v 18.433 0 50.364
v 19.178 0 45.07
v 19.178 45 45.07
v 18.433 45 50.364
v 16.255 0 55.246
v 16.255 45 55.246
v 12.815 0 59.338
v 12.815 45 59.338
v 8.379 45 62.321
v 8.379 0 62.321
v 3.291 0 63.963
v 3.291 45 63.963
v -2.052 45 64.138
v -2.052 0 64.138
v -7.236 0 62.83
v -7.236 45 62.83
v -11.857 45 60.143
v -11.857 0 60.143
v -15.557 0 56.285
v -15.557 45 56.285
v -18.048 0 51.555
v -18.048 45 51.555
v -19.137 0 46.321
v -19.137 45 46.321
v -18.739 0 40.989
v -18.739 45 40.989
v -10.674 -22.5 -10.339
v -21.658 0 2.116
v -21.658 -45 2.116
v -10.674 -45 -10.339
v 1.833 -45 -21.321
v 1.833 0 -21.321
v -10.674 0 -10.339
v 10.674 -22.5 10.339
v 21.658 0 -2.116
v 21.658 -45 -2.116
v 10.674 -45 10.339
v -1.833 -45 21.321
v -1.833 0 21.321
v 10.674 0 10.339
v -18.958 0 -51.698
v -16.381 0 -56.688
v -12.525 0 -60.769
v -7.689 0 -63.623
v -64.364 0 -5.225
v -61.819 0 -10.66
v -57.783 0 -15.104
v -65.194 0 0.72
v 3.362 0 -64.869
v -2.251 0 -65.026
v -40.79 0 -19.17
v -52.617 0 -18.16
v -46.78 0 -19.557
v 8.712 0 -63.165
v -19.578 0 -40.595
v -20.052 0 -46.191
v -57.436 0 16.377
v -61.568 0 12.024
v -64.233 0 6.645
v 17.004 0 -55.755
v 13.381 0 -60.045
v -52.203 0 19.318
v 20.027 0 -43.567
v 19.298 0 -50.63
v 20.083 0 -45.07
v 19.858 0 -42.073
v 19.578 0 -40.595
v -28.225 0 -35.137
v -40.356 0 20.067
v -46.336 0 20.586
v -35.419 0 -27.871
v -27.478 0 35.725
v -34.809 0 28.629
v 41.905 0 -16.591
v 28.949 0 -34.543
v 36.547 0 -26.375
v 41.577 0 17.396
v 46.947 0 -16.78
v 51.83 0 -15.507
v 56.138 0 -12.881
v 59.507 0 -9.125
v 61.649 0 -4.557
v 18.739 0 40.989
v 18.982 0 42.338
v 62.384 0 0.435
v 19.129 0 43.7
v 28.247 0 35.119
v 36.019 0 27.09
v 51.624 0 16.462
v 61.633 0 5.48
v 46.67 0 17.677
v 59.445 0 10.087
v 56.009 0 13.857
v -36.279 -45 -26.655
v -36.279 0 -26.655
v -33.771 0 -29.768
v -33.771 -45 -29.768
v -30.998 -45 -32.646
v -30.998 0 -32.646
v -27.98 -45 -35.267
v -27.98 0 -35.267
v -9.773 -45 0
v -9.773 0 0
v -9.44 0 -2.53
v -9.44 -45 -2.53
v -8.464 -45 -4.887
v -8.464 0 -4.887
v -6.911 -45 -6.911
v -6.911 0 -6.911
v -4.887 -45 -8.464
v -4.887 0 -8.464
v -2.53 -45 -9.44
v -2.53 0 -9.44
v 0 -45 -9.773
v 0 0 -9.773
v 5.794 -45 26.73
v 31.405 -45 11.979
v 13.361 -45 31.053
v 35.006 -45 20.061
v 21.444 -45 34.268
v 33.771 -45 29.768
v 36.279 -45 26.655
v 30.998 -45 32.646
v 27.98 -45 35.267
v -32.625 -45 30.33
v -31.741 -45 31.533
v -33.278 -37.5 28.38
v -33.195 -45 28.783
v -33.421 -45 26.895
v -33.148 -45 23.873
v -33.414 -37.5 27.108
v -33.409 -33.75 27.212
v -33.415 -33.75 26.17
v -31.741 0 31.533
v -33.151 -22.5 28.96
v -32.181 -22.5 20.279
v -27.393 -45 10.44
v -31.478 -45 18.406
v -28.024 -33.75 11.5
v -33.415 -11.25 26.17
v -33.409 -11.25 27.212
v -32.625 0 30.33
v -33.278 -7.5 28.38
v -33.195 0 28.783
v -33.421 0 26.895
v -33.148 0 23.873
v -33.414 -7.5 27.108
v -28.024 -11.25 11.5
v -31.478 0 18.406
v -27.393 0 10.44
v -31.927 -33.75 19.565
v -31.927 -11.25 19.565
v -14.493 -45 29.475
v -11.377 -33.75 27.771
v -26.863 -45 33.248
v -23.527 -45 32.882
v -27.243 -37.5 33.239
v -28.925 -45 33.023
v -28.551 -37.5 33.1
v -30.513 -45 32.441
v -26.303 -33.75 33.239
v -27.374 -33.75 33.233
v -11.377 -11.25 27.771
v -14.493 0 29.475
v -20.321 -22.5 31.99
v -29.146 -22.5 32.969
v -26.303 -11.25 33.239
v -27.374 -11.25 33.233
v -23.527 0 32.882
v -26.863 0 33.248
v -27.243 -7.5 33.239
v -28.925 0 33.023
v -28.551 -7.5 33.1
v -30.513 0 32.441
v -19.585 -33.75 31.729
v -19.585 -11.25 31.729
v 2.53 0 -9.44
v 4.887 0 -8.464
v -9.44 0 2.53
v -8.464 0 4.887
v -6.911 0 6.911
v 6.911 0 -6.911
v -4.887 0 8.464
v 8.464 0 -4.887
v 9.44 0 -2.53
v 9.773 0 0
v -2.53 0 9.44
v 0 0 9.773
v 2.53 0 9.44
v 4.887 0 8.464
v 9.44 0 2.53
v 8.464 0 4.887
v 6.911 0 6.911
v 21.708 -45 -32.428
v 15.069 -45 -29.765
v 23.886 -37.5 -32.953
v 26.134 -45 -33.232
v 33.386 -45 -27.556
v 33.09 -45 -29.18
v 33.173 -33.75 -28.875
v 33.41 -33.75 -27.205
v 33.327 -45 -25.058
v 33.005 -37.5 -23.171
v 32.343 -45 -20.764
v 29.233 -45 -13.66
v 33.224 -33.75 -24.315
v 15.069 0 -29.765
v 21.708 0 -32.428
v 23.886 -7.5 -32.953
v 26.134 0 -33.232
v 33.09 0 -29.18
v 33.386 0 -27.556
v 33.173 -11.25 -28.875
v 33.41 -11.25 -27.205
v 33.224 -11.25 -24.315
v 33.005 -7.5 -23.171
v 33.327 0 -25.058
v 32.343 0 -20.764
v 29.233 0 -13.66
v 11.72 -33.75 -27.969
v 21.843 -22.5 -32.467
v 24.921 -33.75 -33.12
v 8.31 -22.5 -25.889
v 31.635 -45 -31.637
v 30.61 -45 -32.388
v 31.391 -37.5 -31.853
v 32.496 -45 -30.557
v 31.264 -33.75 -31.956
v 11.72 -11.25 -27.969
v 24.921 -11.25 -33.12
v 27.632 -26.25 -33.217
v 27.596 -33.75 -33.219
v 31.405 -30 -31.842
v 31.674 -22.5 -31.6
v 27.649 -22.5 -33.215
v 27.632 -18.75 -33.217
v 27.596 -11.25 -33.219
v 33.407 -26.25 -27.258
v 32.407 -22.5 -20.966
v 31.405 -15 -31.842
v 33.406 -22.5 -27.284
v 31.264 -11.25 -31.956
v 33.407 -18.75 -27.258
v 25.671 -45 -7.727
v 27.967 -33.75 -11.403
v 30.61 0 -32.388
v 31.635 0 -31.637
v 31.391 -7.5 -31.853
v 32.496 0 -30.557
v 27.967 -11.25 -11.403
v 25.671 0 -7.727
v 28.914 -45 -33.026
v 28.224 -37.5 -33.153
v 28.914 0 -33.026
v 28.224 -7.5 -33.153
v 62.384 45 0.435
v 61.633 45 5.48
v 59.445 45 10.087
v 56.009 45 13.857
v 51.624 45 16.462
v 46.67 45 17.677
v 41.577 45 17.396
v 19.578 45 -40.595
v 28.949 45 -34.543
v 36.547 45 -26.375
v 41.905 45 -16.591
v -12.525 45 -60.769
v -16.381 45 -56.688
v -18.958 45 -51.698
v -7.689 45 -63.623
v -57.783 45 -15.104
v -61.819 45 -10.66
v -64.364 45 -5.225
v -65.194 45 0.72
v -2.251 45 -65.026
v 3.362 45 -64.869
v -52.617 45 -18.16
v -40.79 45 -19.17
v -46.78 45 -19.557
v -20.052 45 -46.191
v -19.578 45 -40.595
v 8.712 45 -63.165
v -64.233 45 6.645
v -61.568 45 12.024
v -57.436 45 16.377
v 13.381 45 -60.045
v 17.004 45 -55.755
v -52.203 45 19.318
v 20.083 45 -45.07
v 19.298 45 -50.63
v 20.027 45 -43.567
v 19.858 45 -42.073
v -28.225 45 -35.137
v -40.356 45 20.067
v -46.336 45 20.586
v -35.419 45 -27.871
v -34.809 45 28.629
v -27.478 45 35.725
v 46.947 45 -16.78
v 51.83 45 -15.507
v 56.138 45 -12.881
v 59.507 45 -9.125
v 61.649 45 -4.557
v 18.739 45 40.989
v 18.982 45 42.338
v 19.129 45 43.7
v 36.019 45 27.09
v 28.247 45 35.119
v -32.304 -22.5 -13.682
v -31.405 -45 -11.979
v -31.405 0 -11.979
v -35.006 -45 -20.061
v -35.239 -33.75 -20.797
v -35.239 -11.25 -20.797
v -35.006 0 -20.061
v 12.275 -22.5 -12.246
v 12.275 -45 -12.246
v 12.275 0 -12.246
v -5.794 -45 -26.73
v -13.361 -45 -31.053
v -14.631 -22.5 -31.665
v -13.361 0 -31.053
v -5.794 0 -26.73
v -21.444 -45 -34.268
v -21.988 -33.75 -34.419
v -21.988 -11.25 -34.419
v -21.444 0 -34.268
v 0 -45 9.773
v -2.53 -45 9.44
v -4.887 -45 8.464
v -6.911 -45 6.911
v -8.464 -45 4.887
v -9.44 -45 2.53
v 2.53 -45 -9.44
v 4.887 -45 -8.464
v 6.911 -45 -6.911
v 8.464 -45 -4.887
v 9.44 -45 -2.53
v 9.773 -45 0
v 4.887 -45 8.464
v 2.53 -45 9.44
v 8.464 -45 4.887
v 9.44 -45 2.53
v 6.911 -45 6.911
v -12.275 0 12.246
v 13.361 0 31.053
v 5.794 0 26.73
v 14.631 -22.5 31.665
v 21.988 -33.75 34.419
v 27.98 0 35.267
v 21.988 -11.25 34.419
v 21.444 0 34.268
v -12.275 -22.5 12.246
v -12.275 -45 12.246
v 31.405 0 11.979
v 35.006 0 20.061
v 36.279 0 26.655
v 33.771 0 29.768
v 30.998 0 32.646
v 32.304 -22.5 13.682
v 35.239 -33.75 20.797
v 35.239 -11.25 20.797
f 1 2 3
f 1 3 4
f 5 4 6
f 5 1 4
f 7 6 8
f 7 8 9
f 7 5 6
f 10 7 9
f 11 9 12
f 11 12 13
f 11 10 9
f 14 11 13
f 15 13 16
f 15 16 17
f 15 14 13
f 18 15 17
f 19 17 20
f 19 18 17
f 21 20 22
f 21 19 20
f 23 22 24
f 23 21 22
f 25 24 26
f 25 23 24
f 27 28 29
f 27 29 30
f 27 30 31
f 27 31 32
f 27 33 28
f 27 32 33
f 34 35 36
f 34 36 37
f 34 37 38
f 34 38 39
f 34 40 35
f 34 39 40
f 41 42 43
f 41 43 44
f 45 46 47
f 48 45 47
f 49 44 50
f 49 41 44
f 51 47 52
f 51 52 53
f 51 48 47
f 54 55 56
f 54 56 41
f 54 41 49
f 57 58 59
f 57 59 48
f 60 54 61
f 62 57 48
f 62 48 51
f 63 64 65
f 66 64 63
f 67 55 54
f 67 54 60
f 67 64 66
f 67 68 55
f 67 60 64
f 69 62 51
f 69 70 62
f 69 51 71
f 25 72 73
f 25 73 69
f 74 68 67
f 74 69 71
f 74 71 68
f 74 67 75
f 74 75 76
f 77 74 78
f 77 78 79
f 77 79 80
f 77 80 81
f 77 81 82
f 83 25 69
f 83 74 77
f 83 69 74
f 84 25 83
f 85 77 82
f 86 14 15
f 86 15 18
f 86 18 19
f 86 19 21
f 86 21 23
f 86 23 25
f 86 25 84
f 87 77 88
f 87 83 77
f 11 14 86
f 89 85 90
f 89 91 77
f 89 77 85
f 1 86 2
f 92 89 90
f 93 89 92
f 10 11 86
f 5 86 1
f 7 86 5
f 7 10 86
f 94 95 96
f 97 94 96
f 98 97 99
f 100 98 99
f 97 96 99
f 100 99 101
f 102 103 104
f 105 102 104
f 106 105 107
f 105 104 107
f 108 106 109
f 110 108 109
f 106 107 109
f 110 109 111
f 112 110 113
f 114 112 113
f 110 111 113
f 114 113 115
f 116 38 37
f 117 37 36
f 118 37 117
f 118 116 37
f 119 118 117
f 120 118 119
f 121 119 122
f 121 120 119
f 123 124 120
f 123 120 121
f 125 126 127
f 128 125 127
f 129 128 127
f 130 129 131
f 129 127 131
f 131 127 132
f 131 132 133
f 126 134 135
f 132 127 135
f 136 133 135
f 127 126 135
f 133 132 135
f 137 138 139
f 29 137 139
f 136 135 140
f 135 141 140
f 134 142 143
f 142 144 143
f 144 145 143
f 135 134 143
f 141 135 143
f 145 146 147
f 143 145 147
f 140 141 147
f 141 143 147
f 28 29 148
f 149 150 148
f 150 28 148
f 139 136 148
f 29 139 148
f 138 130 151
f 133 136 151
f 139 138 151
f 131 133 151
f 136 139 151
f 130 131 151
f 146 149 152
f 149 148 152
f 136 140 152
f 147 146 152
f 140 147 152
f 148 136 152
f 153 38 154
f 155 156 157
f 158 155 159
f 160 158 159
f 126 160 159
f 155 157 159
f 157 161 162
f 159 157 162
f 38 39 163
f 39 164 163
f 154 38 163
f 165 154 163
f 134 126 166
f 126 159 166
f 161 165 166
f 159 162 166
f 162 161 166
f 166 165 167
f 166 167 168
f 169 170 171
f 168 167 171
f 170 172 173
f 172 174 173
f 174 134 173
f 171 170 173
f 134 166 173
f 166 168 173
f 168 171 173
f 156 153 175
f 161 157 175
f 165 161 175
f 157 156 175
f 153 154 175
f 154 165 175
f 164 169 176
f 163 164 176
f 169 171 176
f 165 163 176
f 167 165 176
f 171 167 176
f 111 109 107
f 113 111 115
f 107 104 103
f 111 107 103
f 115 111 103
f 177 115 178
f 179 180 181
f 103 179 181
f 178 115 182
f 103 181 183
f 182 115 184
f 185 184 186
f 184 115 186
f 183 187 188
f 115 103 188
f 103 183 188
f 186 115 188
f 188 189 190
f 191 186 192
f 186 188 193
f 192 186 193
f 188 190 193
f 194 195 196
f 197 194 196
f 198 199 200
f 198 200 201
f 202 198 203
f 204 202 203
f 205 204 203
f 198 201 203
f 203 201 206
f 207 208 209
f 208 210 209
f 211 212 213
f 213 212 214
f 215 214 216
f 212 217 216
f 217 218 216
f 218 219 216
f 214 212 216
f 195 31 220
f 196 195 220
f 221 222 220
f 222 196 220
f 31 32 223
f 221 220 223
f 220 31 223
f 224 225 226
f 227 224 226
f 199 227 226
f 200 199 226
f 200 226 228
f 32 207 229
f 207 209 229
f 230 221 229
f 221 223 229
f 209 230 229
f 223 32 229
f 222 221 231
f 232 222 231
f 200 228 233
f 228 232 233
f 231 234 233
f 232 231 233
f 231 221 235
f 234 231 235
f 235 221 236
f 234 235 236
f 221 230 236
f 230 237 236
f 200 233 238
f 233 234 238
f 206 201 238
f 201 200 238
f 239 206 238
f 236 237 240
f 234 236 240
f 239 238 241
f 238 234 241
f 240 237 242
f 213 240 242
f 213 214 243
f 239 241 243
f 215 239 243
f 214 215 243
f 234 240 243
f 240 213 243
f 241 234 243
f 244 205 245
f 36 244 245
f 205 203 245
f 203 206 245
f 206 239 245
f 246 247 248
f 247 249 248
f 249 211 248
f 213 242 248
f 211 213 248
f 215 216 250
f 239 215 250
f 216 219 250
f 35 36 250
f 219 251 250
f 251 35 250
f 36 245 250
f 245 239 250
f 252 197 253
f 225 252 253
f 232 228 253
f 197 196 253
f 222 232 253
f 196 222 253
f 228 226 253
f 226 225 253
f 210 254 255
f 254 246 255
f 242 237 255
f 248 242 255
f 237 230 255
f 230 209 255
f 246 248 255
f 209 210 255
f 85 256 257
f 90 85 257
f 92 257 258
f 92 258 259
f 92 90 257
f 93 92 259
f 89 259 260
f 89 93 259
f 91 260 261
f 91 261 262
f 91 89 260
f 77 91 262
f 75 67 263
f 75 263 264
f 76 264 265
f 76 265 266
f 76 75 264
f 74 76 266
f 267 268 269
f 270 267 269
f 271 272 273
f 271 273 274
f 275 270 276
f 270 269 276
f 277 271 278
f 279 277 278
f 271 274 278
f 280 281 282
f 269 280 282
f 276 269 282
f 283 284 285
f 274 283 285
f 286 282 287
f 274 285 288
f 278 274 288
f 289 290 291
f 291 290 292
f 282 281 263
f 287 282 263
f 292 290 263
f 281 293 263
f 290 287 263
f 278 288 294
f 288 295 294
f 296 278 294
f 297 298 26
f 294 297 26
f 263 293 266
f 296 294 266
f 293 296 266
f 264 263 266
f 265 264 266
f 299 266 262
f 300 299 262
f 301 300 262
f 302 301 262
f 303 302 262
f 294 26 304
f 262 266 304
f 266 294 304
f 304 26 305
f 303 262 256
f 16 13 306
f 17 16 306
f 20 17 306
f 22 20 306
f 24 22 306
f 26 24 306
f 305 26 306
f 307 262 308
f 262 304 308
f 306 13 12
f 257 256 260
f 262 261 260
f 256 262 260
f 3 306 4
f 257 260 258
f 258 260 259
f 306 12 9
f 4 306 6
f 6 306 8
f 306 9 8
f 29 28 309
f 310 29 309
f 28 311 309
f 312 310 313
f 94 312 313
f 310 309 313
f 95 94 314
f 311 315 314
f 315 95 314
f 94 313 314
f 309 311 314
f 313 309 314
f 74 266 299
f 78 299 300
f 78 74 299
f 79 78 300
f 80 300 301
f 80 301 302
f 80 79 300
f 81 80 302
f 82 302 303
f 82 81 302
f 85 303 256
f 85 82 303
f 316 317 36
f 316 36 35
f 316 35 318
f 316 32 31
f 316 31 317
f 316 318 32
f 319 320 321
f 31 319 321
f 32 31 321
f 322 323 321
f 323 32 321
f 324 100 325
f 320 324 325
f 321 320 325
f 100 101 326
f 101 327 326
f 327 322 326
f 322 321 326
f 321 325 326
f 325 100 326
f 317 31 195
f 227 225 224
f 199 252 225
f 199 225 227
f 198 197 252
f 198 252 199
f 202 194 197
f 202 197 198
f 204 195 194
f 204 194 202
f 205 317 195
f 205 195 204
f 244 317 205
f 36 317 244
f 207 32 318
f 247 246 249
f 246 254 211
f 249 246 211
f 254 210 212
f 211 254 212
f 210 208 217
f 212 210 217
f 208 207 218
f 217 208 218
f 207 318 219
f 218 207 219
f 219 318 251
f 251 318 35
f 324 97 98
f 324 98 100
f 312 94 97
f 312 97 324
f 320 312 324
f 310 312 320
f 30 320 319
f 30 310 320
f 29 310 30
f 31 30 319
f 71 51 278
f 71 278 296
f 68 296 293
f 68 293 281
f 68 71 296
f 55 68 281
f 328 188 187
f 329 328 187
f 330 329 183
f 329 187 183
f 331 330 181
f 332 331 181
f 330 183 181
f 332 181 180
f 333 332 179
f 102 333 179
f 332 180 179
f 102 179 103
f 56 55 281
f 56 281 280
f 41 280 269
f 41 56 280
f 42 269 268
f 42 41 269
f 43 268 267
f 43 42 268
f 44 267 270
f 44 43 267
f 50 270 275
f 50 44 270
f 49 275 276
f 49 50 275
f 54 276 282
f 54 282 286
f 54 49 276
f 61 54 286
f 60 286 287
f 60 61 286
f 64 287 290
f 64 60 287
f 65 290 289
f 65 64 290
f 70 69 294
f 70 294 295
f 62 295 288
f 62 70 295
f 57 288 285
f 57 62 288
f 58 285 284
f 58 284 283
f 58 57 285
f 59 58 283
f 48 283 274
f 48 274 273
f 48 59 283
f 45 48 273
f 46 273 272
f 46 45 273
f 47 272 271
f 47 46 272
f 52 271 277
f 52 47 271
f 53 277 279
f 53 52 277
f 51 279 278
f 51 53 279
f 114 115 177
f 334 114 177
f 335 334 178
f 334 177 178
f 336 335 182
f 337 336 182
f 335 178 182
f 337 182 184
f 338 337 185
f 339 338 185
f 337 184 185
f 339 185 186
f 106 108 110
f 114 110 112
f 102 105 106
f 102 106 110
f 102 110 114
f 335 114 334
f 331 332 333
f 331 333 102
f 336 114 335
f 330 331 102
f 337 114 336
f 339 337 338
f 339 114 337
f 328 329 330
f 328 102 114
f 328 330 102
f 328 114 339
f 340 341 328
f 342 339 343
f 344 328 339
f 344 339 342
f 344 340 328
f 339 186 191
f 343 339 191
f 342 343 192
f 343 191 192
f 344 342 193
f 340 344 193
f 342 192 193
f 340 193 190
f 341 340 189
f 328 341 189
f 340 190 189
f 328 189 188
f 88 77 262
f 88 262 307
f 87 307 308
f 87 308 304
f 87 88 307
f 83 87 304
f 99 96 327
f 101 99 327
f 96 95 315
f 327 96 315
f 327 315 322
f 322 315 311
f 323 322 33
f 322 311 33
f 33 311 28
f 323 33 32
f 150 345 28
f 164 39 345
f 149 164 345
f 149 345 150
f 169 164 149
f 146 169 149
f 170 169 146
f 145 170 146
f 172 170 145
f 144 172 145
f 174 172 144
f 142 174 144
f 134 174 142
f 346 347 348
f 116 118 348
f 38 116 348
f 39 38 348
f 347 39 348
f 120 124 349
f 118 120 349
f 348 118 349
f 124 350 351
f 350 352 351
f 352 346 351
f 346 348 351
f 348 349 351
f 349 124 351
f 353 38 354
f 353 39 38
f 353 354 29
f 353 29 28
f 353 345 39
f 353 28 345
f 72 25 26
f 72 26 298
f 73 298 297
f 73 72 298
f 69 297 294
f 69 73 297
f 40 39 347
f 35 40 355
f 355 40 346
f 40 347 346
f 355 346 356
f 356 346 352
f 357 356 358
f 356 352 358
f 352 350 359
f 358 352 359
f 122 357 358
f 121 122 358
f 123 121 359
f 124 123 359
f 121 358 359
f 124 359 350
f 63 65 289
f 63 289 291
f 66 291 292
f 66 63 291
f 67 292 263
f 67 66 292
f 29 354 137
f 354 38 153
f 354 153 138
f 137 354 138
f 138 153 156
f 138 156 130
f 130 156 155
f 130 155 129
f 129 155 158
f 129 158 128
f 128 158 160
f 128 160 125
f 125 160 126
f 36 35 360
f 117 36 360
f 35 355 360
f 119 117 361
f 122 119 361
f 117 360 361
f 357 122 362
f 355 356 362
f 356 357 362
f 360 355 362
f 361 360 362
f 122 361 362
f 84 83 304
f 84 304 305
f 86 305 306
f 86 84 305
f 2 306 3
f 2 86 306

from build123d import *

# Parameters (mm, degrees)
F2_DEPTH = 45
F4_DEPTH = 45


with BuildPart() as f2:
    # F1 (on Front) → F2 (new body)
    with BuildSketch(Plane.XZ):
        with BuildLine():
            ThreePointArc((36.2788785414, 26.6548611558), (32.4166318197, 31.2378077483), (27.9798294247, 35.2670922649))
            add(Edge.make_bspline(
                [(27.9798294247, 35.2670922649), (16.373706559, 35.4370582191), (-1.8333992833, 21.3207404168)],
                knots=[3.493784329, 3.493784329, 3.493784329, 4.4250054126, 4.4250054126, 4.4250054126], degree=2, weights=[1, 0.8935476182, 1]))
            add(Edge.make_bspline(
                [(21.6583468151, -2.1163838559), (11.4930271298, 11.1332547343), (-1.8333992833, 21.3207404168)],
                knots=[4.3261054837, 4.3261054837, 4.3261054837, 5.0859336443, 5.0859336443, 5.0859336443], degree=2, weights=[1, 0.9286965015, 1]))
            add(Edge.make_bspline(
                [(21.6583468151, -2.1163838559), (36.023638163, 15.2572930769), (36.2788785414, 26.6548611558)],
                knots=[1.8725359052, 1.8725359052, 1.8725359052, 2.7894009782, 2.7894009782, 2.7894009782], degree=2, weights=[1, 0.8967472689, 1]))
        make_face()
    extrude(amount=F2_DEPTH)


with BuildPart() as f2b:
    # F1 (on Front) → F2, piece 2 (new body)
    with BuildSketch(Plane.XZ):
        with BuildLine():
            add(Edge.make_bspline(
                [(-21.6583468151, 2.1163838559), (-36.023638163, -15.2572930769), (-36.2788785414, -26.6548611558)],
                knots=[5.0141285588, 5.0141285588, 5.0141285588, 5.9309936318, 5.9309936318, 5.9309936318], degree=2, weights=[1, 0.8967472689, 1]))
            ThreePointArc((-36.2788785414, -26.6548611558), (-32.4166318197, -31.2378077483), (-27.9798294247, -35.2670922649))
            add(Edge.make_bspline(
                [(-27.9798294247, -35.2670922649), (-16.373706559, -35.4370582191), (1.8333992833, -21.3207404168)],
                knots=[0.3521916754, 0.3521916754, 0.3521916754, 1.283412759, 1.283412759, 1.283412759], degree=2, weights=[1, 0.8935476182, 1]))
            add(Edge.make_bspline(
                [(-21.6583468151, 2.1163838559), (-11.4930271298, -11.1332547343), (1.8333992833, -21.3207404168)],
                knots=[1.1845128301, 1.1845128301, 1.1845128301, 1.9443409907, 1.9443409907, 1.9443409907], degree=2, weights=[1, 0.9286965015, 1]))
        make_face()
    extrude(amount=F2_DEPTH)


with BuildPart() as f2c:
    # F1 (on Front) → F2, piece 3 (new body)
    with BuildSketch(Plane.XZ):
        with BuildLine():
            add(Edge.make_bspline(
                [(1.8333992833, -21.3207404168), (85.4103636735, -85.2117717946), (21.6583468151, -2.1163838559)],
                knots=[1.9443409907, 1.9443409907, 1.9443409907, 4.3261054837, 4.3261054837, 4.3261054837], degree=2, weights=[1, 0.3708406775, 1]))
            add(Edge.make_bspline(
                [(1.8333992833, -21.3207404168), (12.8270090032, -12.7971842874), (21.6583468151, -2.1163838559)],
                knots=[1.283412759, 1.283412759, 1.283412759, 1.8725359052, 1.8725359052, 1.8725359052], degree=2, weights=[1, 0.9569295185, 1]))
        make_face()
    extrude(amount=F2_DEPTH)


with BuildPart() as f2d:
    # F1 (on Front) → F2, piece 4 (new body)
    with BuildSketch(Plane.XZ):
        with BuildLine():
            add(Edge.make_bspline(
                [(-1.8333992833, 21.3207404168), (-12.8270090032, 12.7971842874), (-21.6583468151, 2.1163838559)],
                knots=[4.4250054126, 4.4250054126, 4.4250054126, 5.0141285588, 5.0141285588, 5.0141285588], degree=2, weights=[1, 0.9569295185, 1]))
            add(Edge.make_bspline(
                [(-1.8333992833, 21.3207404168), (-24.5980924206, 38.7233792199), (-31.7409783602, 31.5334945917)],
                knots=[5.0859336443, 5.0859336443, 5.0859336443, 6.2831853072, 6.2831853072, 6.2831853072], degree=2, weights=[1, 0.8261107493, 1]))
            add(Edge.make_bspline(
                [(-31.7409783602, 31.5334945917), (-38.7865541351, 24.4415604086), (-21.6583468151, 2.1163838559)],
                knots=[0, 0, 0, 1.1845128301, 1.1845128301, 1.1845128301], degree=2, weights=[1, 0.8296831834, 1]))
        make_face()
    extrude(amount=F2_DEPTH)


with BuildPart() as f2e:
    # F0 (on Front) → F2, piece 5 (new body)
    with BuildSketch(Plane.XZ):
        with BuildLine():
            Line((0, 0), (9.7734186146, 0))
            ThreePointArc((9.7734186146, 0), (6.9108505778, 6.9108505778), (0, 9.7734186146))
            Line((0, 9.7734186146), (0, 0))
        make_face()
        with BuildLine():
            ThreePointArc((0, -9.7734186146), (6.9108505778, -6.9108505778), (9.7734186146, 0))
            Line((9.7734186146, 0), (0, 0))
            Line((0, 0), (0, -9.7734186146))
        make_face()
        with BuildLine():
            Line((0, 0), (0, 9.7734186146))
            ThreePointArc((0, 9.7734186146), (-6.9108505778, 6.9108505778), (-9.7734186146, 0))
            Line((-9.7734186146, 0), (0, 0))
        make_face()
        with BuildLine():
            ThreePointArc((-9.7734186146, 0), (-6.9108505778, -6.9108505778), (0, -9.7734186146))
            Line((0, -9.7734186146), (0, 0))
            Line((0, 0), (-9.7734186146, 0))
        make_face()
    extrude(amount=F2_DEPTH)


with BuildPart() as f4:
    # F3 (on Front) → F4 (new body)
    with BuildSketch(Plane.XZ):
        with BuildLine():
            ThreePointArc((41.9050263243, -16.5907966242), (44.2715281198, -8.4449725759), (45.069787706, 0))
            ThreePointArc((45.069787706, 0), (44.188031189, 8.8715085246), (41.577263445, 17.3958882582))
            ThreePointArc((41.577263445, 17.3958882582), (27.7518148175, 0.2676346564), (41.9050263243, -16.5907966242))
        make_face()
        with BuildLine():
            ThreePointArc((-19.5782042129, -40.5953160311), (0, -45.069787706), (19.5782042129, -40.5953160311))
            ThreePointArc((19.5782042129, -40.5953160311), (0, -24.9867855158), (-19.5782042129, -40.5953160311))
        make_face()
        with BuildLine():
            ThreePointArc((-18.7389453169, 40.9894827032), (0, 45.069787706), (18.7389453169, 40.9894827032))
            ThreePointArc((18.7389453169, 40.9894827032), (19.0679453197, 43.0178564721), (19.1780332804, 45.069787706))
            ThreePointArc((19.1780332804, 45.069787706), (-2.051931234, 64.1377330257), (-18.7389453169, 40.9894827032))
        make_face()
        with BuildLine():
            ThreePointArc((-40.7896390156, -19.1700577162), (-45.0670371968, 0.497917832), (-40.3561375829, 20.0665872348))
            ThreePointArc((-40.3561375829, 20.0665872348), (-65.1935359253, 0.7202830736), (-40.7896390156, -19.1700577162))
        make_face()
        with BuildLine():
            ThreePointArc((41.577263445, 17.3958882582), (44.188031189, 8.8715085246), (45.069787706, 0))
            ThreePointArc((45.069787706, 0), (44.2715281198, -8.4449725759), (41.9050263243, -16.5907966242))
            ThreePointArc((41.9050263243, -16.5907966242), (56.1379361889, -12.8814232649), (62.3843744183, 0.4346265766))
            ThreePointArc((62.3843744183, 0.4346265766), (56.0090092679, 13.8568121744), (41.577263445, 17.3958882582))
        make_face()
        with BuildLine():
            ThreePointArc((-24.9393101178, 0.497917832), (-29.2565169794, 12.9539544337), (-40.3561375829, 20.0665872348))
            ThreePointArc((-40.3561375829, 20.0665872348), (-45.0670371968, 0.497917832), (-40.7896390156, -19.1700577162))
            ThreePointArc((-40.7896390156, -19.1700577162), (-29.3950925094, -12.1320286082), (-24.9393101178, 0.497917832))
        make_face()
        with BuildLine():
            ThreePointArc((20.0830021903, -45.069787706), (19.9564036723, -42.8183593945), (19.5782042129, -40.5953160311))
            ThreePointArc((19.5782042129, -40.5953160311), (0, -45.069787706), (-19.5782042129, -40.5953160311))
            ThreePointArc((-19.5782042129, -40.5953160311), (-2.2514283115, -65.0261913783), (20.0830021903, -45.069787706))
        make_face()
        with BuildLine():
            ThreePointArc((41.9050263243, -16.5907966242), (27.7518148175, 0.2676346564), (41.577263445, 17.3958882582))
            ThreePointArc((41.577263445, 17.3958882582), (32.3832624138, 31.3466119271), (18.7389453169, 40.9894827032))
            ThreePointArc((18.7389453169, 40.9894827032), (0, 25.8917544256), (-18.7389453169, 40.9894827032))
            ThreePointArc((-18.7389453169, 40.9894827032), (-31.344841592, 32.3849759833), (-40.3561375829, 20.0665872348))
            ThreePointArc((-40.3561375829, 20.0665872348), (-29.2565169794, 12.9539544337), (-24.9393101178, 0.497917832))
            ThreePointArc((-24.9393101178, 0.497917832), (-29.3950925094, -12.1320286082), (-40.7896390156, -19.1700577162))
            ThreePointArc((-40.7896390156, -19.1700577162), (-32.028573922, -31.7089296001), (-19.5782042129, -40.5953160311))
            ThreePointArc((-19.5782042129, -40.5953160311), (0, -24.9867855158), (19.5782042129, -40.5953160311))
            ThreePointArc((19.5782042129, -40.5953160311), (33.0015324995, -30.6950259253), (41.9050263243, -16.5907966242))
        make_face()
        with BuildLine():
            ThreePointArc((-18.7389453169, 40.9894827032), (0, 25.8917544256), (18.7389453169, 40.9894827032))
            ThreePointArc((18.7389453169, 40.9894827032), (0, 45.069787706), (-18.7389453169, 40.9894827032))
        make_face()
    extrude(amount=-F4_DEPTH)


solid = Compound([f2.part, f2b.part, f2c.part, f2d.part, f2e.part, f4.part])
